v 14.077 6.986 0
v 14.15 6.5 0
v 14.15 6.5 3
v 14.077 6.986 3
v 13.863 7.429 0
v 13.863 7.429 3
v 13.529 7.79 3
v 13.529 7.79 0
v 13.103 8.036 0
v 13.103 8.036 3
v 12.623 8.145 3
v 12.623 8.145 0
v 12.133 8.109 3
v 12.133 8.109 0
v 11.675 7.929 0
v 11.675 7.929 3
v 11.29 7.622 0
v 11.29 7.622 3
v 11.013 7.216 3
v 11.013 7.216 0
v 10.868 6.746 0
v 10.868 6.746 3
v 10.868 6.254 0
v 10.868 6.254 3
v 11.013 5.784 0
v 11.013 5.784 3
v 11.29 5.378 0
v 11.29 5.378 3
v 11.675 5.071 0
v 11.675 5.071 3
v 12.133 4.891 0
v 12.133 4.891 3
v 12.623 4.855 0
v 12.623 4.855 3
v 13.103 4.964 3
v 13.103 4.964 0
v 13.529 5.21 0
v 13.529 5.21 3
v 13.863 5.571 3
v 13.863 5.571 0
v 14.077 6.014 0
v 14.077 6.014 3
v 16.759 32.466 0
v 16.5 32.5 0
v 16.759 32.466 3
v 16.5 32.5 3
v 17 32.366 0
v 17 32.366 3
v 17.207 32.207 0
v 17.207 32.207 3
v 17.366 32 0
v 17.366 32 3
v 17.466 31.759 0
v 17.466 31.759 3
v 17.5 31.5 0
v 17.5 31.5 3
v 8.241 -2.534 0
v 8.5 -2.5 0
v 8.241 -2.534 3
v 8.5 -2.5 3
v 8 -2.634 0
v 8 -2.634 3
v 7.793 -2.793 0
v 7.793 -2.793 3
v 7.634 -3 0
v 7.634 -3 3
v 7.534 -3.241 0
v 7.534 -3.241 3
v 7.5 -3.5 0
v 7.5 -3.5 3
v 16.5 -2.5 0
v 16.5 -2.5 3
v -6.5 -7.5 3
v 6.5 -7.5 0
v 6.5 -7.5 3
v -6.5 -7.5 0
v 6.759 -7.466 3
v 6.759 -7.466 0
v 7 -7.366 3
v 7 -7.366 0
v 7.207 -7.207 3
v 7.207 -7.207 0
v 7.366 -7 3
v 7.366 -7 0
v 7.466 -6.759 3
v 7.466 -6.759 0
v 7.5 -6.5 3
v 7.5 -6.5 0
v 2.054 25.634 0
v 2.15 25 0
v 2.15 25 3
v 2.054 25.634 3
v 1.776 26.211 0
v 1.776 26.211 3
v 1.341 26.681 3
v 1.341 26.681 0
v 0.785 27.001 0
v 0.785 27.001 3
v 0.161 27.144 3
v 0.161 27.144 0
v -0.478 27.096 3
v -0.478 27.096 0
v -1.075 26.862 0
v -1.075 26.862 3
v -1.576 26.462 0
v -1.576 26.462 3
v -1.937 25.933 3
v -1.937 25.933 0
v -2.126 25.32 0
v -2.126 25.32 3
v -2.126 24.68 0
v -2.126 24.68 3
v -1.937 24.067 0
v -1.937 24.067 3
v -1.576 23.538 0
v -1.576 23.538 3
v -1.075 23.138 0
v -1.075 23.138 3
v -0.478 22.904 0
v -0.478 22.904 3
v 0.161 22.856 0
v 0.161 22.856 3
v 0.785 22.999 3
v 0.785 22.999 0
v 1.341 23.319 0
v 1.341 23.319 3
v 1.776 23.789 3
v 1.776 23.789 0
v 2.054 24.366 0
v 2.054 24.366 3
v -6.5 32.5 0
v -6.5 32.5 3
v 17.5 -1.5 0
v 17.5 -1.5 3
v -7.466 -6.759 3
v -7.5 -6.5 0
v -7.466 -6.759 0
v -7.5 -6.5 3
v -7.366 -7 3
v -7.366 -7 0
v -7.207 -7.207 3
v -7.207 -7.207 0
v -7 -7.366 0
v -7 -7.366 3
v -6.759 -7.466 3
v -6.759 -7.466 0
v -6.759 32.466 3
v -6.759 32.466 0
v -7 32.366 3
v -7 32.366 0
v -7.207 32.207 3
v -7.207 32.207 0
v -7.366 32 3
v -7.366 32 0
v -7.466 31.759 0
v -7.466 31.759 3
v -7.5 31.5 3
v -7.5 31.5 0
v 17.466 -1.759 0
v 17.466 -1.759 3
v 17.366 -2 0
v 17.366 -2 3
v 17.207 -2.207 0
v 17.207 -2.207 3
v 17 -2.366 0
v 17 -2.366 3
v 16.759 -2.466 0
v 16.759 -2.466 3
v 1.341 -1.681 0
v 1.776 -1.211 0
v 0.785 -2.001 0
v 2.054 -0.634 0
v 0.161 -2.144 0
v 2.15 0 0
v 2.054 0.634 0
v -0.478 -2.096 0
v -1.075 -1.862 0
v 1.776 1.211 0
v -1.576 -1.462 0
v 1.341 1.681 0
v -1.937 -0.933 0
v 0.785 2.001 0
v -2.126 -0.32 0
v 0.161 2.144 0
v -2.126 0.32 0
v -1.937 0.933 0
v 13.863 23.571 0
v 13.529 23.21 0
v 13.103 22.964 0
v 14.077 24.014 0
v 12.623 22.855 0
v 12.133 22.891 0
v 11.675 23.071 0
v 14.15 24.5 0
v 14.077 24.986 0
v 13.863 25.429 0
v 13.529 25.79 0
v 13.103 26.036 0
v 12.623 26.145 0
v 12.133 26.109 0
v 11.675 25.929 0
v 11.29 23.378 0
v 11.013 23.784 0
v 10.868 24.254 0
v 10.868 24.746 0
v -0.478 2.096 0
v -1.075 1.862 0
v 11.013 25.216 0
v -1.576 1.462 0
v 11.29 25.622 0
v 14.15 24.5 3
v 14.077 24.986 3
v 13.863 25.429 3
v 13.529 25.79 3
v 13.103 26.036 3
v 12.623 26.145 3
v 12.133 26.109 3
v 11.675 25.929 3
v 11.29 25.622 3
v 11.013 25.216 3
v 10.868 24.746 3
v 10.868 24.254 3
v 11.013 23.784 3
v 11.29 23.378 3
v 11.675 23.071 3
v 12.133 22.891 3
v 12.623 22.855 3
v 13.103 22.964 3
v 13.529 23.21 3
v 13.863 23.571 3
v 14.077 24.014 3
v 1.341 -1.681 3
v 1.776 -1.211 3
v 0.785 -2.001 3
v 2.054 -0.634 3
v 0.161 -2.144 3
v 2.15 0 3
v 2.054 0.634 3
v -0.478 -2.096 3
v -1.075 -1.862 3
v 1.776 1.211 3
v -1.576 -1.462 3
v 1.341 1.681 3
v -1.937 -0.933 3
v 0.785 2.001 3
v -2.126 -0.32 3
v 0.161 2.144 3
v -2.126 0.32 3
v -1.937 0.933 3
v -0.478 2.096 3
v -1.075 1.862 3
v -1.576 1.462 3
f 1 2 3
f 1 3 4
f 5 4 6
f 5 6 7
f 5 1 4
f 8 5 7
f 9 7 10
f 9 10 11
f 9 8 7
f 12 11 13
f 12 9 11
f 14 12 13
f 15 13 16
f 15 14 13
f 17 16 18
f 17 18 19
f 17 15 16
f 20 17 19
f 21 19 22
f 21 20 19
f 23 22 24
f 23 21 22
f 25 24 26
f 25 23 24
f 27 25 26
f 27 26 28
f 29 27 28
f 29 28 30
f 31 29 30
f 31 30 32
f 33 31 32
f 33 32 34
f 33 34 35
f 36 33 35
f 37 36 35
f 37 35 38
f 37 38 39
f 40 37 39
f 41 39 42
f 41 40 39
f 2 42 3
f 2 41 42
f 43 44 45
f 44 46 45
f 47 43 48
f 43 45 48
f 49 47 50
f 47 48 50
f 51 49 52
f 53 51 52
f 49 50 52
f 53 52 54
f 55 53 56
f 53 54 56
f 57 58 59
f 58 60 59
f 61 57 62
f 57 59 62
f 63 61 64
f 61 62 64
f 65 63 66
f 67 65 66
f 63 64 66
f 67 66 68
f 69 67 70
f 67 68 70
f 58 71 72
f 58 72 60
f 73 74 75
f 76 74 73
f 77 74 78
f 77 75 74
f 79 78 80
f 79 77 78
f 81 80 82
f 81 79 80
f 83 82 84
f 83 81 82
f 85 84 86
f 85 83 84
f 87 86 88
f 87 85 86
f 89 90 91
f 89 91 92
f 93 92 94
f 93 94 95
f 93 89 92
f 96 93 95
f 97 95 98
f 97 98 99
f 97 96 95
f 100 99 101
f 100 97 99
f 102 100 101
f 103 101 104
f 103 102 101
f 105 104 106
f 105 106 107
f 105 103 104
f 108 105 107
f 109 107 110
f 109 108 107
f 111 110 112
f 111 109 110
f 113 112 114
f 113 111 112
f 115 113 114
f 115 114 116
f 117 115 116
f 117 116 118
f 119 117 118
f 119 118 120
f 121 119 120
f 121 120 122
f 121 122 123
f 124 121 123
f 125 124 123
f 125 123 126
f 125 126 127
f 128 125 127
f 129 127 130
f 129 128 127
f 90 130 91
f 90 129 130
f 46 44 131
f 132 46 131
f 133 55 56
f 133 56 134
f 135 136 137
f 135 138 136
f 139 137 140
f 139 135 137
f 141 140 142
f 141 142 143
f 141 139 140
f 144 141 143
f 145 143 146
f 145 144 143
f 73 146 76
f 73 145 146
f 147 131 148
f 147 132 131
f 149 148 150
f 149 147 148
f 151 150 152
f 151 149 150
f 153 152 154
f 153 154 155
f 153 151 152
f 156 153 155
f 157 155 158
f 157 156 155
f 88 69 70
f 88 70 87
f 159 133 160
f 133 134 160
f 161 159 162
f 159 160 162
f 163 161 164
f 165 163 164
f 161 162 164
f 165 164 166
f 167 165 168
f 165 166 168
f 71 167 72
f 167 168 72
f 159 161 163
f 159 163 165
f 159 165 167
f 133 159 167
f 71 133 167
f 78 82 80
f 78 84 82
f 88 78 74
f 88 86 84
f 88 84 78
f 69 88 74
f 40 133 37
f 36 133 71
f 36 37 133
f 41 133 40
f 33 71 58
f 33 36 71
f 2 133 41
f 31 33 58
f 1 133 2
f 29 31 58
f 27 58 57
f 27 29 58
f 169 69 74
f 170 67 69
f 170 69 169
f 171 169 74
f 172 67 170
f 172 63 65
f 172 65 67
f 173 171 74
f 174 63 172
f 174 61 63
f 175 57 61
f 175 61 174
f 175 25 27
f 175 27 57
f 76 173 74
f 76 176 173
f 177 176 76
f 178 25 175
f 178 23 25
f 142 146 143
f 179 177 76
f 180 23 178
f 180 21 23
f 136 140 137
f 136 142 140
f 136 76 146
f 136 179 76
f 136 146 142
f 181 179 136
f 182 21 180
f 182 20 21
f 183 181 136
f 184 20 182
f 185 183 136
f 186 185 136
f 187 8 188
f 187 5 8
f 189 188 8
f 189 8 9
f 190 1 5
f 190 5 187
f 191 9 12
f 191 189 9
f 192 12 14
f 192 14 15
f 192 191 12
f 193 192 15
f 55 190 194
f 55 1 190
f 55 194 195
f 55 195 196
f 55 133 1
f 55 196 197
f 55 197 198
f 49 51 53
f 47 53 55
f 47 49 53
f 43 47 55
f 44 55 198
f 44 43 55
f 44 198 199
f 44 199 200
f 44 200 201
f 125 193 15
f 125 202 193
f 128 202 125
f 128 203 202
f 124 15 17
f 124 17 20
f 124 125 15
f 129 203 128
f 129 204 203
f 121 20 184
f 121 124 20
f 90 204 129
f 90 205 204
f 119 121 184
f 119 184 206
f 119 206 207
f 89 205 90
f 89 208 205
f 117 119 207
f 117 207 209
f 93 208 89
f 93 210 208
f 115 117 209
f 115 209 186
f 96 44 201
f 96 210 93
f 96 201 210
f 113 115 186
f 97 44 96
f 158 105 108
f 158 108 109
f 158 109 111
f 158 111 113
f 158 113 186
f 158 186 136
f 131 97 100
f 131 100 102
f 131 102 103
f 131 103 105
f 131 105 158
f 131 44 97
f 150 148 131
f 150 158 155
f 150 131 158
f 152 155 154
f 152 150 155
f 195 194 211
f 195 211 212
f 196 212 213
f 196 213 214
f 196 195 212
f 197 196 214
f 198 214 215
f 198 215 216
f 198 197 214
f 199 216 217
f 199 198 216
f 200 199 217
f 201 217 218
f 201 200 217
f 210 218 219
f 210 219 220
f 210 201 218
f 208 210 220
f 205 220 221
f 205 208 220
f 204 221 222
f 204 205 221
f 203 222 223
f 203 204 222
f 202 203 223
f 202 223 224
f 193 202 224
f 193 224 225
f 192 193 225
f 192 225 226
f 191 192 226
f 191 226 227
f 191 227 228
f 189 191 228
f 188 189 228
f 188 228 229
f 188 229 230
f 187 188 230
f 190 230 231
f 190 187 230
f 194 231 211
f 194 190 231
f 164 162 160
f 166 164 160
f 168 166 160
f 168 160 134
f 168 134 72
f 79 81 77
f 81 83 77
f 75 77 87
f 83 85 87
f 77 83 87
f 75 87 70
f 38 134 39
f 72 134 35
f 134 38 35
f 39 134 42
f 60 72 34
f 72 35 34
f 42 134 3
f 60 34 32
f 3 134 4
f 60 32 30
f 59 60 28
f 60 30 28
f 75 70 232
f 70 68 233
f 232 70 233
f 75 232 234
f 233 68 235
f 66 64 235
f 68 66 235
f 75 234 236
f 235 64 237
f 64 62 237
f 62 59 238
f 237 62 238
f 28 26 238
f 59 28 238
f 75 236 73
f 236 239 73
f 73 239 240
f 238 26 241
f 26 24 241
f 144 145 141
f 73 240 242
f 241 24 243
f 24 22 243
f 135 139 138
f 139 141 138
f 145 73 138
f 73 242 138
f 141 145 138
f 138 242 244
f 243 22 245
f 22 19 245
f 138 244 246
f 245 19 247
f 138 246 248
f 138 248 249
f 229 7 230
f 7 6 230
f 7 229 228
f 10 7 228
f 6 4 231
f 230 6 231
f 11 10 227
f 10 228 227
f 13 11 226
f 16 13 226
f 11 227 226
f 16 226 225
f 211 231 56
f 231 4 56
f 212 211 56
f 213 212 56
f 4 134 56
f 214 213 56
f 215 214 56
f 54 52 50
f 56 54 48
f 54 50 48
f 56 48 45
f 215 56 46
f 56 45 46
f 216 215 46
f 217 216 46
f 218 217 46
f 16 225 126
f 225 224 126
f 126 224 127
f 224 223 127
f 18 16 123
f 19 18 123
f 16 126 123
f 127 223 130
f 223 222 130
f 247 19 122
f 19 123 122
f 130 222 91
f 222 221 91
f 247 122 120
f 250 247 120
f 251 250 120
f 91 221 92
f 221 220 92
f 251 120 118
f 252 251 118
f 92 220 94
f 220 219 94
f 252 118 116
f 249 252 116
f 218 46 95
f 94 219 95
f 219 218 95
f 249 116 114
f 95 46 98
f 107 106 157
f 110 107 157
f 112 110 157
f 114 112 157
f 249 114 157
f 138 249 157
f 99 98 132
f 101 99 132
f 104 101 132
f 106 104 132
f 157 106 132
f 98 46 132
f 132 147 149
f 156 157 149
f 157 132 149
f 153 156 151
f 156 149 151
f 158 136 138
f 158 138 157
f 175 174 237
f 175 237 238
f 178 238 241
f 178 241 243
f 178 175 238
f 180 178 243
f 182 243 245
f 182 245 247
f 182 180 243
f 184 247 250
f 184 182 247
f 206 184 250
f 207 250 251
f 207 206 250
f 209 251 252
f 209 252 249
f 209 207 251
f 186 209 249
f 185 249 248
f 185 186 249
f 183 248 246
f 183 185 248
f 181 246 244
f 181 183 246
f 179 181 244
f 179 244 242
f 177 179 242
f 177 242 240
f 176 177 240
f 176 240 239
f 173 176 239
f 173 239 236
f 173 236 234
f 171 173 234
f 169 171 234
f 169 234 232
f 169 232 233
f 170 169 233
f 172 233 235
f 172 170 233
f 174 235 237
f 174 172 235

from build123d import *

# Parameters (mm, degrees)
SKETCH_1_R      = 2.15
SKETCH_1_R_2    = 1.65
EXTRUDE_1_DEPTH = 3
FILLET_1_R      = 1


with BuildPart() as part:
    # 草图1 → 凸台-拉伸1 (new body)
    with BuildSketch(Plane.XY):
        Polygon((7.5, 32.5), (17.5, 32.5), (17.5, -2.5), (7.5, -2.5), (7.5, -7.5), (-7.5, -7.5), (-7.5, 32.5), align=None)
        Circle(SKETCH_1_R, mode=Mode.SUBTRACT)
        with Locations((0, 25)):
            Circle(SKETCH_1_R, mode=Mode.SUBTRACT)
        with Locations((12.5, 24.5)):
            Circle(SKETCH_1_R_2, mode=Mode.SUBTRACT)
        with Locations((12.5, 6.5)):
            Circle(SKETCH_1_R_2, mode=Mode.SUBTRACT)
    extrude(amount=EXTRUDE_1_DEPTH)

    # 圆角1
    fillet_1_edges = [part.edges().sort_by_distance(p)[0] for p in [
        (7.5, -7.5, 1.5),
        (-7.5, -7.5, 1.5),
        (-7.5, 32.5, 1.5),
        (17.5, 32.5, 1.5),
        (17.5, -2.5, 1.5),
        (7.5, -2.5, 1.5),
    ]]
    fillet(fillet_1_edges, radius=FILLET_1_R)


solid = part.part
